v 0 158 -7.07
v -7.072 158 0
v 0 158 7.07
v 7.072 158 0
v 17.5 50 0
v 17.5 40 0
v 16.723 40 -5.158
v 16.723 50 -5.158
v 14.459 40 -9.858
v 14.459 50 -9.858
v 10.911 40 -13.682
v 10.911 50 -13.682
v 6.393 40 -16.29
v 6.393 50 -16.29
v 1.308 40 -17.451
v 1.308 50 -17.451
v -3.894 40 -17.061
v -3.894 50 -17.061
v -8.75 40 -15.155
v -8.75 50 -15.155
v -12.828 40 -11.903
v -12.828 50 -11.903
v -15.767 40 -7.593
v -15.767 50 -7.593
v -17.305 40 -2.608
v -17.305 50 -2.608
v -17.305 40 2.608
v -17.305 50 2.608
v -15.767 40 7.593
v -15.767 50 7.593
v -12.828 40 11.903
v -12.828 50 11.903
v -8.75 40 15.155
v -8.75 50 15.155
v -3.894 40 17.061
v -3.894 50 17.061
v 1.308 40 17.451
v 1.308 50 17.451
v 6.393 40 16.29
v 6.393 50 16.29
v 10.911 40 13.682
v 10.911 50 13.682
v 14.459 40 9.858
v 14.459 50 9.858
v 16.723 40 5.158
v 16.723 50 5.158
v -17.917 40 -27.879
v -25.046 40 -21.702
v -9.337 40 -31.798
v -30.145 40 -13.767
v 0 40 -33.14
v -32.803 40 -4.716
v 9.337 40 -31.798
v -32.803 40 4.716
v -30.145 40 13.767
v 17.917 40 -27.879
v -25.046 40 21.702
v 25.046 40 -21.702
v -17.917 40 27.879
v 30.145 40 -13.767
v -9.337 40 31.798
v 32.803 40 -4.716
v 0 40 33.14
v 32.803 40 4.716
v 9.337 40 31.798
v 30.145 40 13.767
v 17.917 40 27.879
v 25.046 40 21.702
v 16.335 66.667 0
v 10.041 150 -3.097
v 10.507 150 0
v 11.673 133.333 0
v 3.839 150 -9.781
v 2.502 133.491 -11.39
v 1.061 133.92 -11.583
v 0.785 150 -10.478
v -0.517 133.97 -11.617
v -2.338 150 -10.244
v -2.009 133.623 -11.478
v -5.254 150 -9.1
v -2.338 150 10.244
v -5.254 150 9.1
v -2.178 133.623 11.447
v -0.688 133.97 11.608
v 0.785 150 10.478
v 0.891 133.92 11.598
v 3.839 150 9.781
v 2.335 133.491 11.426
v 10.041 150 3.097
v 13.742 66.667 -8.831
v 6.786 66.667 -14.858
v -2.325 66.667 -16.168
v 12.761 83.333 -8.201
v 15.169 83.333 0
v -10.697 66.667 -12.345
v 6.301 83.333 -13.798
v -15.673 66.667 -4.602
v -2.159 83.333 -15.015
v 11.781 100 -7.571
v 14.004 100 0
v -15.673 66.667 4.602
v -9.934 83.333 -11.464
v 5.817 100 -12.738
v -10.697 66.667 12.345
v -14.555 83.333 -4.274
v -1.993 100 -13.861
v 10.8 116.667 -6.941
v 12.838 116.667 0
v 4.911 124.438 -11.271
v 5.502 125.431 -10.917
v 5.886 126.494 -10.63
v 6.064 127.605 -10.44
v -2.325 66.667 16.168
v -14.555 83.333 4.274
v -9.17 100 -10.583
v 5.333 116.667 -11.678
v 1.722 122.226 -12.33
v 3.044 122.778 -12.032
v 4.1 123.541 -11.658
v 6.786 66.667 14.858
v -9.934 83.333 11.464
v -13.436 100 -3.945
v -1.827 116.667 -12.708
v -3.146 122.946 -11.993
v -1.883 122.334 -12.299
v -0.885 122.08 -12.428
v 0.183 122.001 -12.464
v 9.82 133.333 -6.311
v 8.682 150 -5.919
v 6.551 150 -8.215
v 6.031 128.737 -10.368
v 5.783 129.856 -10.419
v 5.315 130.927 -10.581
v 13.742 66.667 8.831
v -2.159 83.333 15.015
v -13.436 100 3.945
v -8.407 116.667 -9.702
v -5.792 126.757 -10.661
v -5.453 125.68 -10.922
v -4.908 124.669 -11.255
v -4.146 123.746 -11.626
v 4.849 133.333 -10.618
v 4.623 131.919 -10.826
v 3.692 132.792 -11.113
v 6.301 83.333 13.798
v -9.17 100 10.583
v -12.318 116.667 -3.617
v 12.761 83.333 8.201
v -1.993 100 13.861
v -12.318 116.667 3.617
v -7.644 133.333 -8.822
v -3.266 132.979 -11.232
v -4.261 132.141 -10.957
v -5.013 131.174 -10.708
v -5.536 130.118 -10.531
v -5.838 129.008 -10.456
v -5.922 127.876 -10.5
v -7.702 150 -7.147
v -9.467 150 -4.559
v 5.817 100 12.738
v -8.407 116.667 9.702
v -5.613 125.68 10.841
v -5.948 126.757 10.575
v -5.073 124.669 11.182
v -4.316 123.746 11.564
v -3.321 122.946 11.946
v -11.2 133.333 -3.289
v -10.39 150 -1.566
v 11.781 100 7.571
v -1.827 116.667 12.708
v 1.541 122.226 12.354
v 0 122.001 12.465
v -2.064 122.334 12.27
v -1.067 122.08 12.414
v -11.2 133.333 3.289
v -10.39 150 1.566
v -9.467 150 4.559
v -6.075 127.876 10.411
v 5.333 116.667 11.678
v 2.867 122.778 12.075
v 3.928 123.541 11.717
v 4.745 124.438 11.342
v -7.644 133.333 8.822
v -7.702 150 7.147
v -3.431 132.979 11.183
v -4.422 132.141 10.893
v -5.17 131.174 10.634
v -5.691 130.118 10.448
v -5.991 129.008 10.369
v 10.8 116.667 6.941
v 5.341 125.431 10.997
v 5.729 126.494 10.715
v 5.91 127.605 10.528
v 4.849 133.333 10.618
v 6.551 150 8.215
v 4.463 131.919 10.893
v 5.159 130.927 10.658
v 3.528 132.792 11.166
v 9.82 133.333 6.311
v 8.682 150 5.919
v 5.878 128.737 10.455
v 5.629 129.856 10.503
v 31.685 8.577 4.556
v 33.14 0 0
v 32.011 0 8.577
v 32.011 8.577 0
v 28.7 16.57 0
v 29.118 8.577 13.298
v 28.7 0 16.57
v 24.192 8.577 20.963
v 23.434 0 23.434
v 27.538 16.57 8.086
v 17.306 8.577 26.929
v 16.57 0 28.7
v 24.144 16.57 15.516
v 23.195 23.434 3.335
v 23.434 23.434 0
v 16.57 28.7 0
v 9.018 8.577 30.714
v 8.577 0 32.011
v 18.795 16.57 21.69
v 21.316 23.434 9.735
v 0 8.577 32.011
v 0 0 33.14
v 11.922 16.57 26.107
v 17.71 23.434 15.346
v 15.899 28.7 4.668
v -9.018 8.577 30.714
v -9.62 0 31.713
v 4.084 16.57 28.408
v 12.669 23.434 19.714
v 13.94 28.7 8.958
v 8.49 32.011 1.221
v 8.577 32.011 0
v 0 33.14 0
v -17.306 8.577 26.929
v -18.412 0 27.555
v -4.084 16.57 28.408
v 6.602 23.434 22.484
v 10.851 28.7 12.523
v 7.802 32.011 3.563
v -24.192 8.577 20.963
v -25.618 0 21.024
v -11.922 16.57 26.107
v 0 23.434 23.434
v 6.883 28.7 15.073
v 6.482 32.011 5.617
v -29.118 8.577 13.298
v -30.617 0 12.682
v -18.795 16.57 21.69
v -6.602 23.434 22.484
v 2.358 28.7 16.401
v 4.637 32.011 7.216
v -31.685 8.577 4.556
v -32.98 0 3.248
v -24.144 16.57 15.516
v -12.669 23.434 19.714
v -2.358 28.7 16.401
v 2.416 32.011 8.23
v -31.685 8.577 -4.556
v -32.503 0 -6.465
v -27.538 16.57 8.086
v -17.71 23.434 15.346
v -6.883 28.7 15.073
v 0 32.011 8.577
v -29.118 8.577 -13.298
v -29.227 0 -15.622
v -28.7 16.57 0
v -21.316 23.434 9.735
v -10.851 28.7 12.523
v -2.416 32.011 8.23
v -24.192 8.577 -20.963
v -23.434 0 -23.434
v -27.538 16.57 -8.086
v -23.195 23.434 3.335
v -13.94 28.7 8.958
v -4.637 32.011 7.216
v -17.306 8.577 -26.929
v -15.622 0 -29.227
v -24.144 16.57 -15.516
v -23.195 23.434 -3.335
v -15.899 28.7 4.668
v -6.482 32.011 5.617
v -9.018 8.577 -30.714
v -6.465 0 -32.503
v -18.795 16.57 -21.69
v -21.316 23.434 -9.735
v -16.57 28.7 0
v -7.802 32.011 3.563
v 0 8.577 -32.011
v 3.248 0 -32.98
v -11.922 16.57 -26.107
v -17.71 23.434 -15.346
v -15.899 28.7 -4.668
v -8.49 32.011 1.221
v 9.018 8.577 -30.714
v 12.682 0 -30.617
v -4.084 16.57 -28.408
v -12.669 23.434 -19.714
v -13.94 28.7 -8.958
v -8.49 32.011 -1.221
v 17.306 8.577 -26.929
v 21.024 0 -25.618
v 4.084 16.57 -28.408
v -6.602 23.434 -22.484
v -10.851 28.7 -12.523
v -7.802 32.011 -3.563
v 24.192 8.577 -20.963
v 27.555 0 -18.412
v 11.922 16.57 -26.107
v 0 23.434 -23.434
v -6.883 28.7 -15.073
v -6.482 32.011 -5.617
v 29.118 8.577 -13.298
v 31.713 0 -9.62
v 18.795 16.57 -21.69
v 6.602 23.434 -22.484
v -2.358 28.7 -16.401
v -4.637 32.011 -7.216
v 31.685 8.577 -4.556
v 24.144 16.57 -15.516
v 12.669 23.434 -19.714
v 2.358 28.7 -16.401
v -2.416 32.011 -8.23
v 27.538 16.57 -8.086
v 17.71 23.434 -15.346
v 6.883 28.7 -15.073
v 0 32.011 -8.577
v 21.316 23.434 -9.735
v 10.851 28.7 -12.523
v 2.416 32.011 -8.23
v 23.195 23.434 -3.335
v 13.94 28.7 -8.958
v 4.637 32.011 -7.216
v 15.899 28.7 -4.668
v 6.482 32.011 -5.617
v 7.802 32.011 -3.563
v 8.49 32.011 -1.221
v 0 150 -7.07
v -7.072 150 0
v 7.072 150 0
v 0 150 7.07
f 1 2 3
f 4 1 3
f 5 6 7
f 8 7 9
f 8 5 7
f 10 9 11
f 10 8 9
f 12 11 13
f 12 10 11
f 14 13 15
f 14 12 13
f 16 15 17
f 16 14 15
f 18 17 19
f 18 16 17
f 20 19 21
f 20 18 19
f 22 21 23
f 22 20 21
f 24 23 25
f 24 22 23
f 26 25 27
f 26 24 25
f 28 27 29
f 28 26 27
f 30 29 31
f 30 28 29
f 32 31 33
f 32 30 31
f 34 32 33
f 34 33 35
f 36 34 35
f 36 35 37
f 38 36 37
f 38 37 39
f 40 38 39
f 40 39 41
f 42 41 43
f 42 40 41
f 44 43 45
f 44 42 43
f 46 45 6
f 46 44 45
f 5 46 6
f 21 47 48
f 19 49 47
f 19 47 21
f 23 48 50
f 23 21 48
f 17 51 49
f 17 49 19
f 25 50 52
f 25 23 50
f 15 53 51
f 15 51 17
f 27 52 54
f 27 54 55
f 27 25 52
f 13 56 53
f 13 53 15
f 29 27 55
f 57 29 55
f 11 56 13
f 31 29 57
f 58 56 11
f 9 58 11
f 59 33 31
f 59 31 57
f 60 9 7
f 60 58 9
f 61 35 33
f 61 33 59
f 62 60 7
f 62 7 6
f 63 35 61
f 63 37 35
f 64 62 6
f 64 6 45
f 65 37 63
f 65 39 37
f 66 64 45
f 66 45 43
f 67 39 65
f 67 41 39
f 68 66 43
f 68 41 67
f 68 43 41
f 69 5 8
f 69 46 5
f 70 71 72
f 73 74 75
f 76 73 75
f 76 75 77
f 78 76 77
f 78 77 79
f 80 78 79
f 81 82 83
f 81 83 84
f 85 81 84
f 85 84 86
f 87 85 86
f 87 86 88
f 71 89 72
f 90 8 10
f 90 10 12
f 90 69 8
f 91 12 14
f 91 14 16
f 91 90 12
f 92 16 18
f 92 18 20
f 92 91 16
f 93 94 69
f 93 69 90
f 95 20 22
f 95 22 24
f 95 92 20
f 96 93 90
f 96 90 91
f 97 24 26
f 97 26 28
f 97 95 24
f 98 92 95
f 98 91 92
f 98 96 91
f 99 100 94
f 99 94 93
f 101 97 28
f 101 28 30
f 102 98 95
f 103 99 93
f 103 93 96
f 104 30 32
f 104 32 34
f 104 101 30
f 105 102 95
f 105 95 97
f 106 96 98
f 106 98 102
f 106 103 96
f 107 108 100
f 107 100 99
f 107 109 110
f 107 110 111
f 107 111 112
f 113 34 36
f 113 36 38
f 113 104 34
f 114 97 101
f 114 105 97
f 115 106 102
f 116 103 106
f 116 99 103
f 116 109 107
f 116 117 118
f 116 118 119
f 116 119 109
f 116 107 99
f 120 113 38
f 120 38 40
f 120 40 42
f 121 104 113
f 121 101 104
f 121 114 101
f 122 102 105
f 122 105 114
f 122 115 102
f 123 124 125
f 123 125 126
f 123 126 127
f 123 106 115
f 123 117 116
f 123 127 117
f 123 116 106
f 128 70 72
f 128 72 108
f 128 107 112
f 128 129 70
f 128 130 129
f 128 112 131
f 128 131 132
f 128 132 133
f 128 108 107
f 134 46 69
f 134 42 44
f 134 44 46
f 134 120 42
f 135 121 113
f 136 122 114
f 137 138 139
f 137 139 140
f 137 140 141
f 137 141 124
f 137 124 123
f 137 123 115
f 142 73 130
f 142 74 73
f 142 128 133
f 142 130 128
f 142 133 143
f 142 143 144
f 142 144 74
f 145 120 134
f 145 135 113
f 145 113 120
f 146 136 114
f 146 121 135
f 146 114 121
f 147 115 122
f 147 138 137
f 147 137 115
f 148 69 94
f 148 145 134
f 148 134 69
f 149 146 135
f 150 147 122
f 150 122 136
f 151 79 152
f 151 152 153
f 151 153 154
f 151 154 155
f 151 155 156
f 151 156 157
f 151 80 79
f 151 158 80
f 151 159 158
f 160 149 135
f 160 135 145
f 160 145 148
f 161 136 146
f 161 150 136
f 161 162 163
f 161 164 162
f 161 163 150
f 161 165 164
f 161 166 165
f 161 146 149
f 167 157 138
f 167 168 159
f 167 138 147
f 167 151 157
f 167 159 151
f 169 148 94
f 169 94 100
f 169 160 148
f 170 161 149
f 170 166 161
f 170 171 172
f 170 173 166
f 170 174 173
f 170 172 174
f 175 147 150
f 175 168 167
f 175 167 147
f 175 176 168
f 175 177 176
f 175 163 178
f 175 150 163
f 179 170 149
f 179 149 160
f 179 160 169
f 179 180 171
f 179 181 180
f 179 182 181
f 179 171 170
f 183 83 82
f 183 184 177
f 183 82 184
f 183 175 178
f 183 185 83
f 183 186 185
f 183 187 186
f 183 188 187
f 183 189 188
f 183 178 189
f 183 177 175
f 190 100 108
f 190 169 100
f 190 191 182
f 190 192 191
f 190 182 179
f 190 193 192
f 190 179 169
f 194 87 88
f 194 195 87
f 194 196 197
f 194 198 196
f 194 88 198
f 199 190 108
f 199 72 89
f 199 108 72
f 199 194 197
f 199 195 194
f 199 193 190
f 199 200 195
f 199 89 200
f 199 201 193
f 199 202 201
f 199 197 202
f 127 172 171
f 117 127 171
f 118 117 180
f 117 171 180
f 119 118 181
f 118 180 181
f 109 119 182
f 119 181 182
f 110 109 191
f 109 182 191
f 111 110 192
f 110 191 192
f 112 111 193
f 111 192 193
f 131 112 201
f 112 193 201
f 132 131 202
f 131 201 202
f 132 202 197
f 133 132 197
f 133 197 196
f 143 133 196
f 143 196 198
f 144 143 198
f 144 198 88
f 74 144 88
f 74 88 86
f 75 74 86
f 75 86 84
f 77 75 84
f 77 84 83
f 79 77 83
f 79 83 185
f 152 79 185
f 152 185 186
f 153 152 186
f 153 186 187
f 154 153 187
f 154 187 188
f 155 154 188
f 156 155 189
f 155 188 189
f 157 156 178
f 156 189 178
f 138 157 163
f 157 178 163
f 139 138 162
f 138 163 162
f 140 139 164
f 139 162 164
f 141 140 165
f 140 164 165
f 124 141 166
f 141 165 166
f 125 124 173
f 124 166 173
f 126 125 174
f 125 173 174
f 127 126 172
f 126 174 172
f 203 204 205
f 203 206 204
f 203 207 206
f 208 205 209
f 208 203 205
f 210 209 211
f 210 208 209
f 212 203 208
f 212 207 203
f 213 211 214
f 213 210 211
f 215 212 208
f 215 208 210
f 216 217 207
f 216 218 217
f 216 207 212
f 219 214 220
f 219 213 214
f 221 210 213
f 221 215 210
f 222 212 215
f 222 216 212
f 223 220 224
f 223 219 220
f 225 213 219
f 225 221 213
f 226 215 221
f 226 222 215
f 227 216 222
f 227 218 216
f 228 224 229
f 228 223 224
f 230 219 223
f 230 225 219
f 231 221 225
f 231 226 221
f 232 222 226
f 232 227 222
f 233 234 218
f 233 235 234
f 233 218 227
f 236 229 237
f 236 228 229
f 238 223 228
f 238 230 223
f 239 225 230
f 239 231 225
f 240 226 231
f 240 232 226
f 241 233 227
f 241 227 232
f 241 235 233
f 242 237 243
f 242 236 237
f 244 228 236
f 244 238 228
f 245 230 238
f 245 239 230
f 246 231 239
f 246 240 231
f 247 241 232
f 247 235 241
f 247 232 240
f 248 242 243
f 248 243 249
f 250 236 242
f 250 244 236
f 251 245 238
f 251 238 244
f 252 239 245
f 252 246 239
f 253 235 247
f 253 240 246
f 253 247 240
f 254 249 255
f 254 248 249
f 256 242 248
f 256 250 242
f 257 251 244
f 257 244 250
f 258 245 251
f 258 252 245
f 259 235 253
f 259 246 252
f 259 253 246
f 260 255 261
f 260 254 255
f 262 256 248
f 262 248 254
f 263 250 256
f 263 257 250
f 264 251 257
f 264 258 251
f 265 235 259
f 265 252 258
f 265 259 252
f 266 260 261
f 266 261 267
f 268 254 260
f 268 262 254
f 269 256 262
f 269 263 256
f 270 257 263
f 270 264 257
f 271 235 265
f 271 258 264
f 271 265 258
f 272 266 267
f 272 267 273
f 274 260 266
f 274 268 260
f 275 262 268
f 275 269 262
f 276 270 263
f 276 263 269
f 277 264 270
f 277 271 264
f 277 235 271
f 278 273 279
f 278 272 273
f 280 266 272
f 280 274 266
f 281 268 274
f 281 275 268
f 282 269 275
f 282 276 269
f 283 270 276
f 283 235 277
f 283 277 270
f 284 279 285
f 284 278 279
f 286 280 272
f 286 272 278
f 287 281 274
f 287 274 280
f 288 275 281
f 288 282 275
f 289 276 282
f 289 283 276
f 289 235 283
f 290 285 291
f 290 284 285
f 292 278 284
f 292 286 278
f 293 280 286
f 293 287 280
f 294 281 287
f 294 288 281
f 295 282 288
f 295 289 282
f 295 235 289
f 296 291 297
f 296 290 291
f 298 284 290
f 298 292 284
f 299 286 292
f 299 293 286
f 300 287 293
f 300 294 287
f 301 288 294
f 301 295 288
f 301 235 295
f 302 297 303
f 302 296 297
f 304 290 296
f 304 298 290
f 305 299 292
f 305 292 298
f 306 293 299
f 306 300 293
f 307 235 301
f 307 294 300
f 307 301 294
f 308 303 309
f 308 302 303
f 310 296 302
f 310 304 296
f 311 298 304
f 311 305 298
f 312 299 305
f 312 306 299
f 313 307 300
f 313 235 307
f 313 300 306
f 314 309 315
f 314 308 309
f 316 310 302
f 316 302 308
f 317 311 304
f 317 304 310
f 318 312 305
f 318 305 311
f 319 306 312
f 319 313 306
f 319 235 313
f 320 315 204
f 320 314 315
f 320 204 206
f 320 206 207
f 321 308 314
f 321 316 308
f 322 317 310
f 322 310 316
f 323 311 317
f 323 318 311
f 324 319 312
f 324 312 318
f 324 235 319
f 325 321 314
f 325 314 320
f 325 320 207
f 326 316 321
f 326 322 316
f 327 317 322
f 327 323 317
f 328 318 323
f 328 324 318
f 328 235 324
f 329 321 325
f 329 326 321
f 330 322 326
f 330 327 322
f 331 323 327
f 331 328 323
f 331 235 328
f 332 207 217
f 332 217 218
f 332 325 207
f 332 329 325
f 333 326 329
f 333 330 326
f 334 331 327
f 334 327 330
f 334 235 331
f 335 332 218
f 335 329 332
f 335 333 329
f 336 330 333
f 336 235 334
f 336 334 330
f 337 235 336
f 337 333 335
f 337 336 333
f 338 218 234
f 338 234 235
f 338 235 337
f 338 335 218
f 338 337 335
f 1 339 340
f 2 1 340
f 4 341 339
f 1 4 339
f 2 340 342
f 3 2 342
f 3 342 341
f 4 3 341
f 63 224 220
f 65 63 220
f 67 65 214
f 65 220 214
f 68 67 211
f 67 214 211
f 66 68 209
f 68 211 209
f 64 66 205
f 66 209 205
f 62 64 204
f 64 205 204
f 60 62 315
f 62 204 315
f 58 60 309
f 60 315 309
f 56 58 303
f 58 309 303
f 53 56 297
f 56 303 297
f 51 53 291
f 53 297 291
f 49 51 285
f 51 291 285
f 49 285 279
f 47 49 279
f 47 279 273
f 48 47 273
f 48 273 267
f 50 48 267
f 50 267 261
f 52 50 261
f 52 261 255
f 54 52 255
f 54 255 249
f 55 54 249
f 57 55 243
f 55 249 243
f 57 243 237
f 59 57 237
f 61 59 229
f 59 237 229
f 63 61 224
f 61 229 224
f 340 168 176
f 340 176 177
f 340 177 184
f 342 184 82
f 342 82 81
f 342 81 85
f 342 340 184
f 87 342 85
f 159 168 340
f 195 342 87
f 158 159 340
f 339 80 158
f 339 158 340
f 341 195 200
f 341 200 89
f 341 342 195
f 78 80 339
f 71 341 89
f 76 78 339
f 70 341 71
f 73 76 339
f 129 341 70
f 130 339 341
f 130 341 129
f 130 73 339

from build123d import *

# Parameters (mm, degrees)
SKETCH1_R           = 33.14
BOSS_EXTRUDE7_DEPTH = 40
SKETCH4_R           = 17.5
CUT_EXTRUDE1_DEPTH  = 5
BOSS_EXTRUDE9_DEPTH = 8
SKETCH7_R           = 6
CUT_EXTRUDE2_DEPTH  = 178.288271755


# Read off the part's stored shape, not the designer's step: Boss-Extrude8
with BuildPart() as part:
    # Sketch1 → Boss-Extrude7 (new body)
    with BuildSketch(Plane(origin=(0, 0, 0), x_dir=(1, 0, 0), z_dir=(0, 1, 0))):
        with Locations(Location((0, 0, 0), (0, 0, 270))):
            Circle(SKETCH1_R)
    extrude(amount=BOSS_EXTRUDE7_DEPTH)

    # Sketch2 → Cut-Revolve1 (revolve, cut)
    with BuildSketch(Plane.XY):
        with BuildLine():
            Line((0, 33.14), (0, 0))
            Line((0, 0), (33.14, 0))
            ThreePointArc((33.14, 0), (23.433518729, 23.433518729), (0, 33.14))
        make_face()
    revolve(axis=Axis((0, 33.14, 0), (0, -1, 0)), mode=Mode.SUBTRACT)

    # Sketch4 → Cut-Extrude1 (cut)
    with BuildSketch(Plane(origin=(0, 40, 0), x_dir=(1, 0, 0), z_dir=(0, 1, 0))):
        with Locations(Location((0, 0, 0), (0, 0, 270))):
            Circle(SKETCH4_R)
    extrude(amount=-CUT_EXTRUDE1_DEPTH, mode=Mode.SUBTRACT)

    # Boss-Extrude8 outline → Boss-Extrude8 (revolve)
    with BuildSketch(Plane.XY):
        Polygon((17.5, 35), (17.5, 50), (10.507318806, 150), (0, 150), (0, 35), align=None)
    revolve(axis=Axis((0, 0, 0), (0, 1, 0)))

    # Sketch6 → Boss-Extrude9 (add)
    with BuildSketch(Plane(origin=(0, 150, 0), x_dir=(1, 0, 0), z_dir=(0, 1, 0))):
        Polygon((0, 7.07), (-7.072135463, 0), (0, -7.07), (7.072135463, 0), align=None)
    extrude(amount=BOSS_EXTRUDE9_DEPTH)

    # Sketch7 → Cut-Extrude2 (cut, through all)
    with BuildSketch(Plane(origin=(-0.293937447, 0, 39.998930323), x_dir=(0.9999729998922554, 0, 0.007348434287890893), z_dir=(-0.007348434287890893, -1.1102230246251565e-15, 0.9999729998922554))):
        with Locations(Location((0, 128, 0), (0, 0, 270.874748169))):
            Circle(SKETCH7_R)
    extrude(amount=-CUT_EXTRUDE2_DEPTH, mode=Mode.SUBTRACT)


solid = part.part
